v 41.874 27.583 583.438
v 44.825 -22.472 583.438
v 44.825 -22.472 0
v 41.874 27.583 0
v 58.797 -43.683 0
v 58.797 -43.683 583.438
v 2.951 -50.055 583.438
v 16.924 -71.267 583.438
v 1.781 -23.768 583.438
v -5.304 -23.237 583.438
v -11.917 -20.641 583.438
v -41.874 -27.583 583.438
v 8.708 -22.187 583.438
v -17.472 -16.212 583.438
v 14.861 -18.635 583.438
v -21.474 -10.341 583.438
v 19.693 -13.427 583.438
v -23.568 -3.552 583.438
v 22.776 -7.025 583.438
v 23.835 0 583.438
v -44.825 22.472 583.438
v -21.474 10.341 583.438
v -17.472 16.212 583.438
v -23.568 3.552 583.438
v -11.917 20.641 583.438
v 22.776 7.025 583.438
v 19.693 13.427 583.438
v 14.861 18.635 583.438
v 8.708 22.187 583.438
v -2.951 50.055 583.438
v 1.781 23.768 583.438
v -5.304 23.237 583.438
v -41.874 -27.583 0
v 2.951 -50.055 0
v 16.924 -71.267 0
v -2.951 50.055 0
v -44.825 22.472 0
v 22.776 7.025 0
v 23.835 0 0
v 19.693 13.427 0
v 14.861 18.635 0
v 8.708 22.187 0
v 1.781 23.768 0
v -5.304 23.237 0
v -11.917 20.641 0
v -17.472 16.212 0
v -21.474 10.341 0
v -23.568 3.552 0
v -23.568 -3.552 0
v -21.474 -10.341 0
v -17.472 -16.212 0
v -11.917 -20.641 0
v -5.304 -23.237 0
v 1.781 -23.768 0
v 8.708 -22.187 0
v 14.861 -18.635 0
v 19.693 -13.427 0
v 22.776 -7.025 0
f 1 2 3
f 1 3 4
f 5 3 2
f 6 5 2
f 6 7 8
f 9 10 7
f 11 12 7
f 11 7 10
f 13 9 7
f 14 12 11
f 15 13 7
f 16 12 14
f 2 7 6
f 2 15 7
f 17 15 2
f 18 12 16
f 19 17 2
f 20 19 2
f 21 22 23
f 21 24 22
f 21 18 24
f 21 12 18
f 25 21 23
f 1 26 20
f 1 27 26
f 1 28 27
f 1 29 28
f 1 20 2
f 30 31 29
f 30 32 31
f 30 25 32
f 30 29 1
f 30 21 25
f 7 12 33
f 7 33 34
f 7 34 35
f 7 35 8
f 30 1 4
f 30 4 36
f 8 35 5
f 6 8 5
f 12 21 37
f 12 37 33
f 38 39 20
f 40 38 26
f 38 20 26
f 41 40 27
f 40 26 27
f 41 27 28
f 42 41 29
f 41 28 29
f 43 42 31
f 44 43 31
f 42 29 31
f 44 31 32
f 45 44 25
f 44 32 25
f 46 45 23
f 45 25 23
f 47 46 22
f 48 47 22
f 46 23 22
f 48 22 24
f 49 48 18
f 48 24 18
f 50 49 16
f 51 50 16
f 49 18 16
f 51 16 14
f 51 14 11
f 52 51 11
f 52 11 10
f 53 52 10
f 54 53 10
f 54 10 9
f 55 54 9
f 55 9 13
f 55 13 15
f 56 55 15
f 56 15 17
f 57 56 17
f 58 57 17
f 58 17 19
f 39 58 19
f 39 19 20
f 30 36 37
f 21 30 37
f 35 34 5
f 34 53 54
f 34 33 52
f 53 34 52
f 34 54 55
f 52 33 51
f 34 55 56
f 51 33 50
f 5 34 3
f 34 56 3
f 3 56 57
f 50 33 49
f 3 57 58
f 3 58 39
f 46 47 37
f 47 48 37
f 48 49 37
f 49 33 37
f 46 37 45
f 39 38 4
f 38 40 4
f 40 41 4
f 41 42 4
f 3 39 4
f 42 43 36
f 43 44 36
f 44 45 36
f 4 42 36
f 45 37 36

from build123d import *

# Parameters (mm, degrees)
F1_DEPTH = 583.438
F2_DEPTH = 25.4
F3_R     = 23.8346071904
F4_DEPTH = 899.16


with BuildPart() as f1:
    # F0 (on Top) → F1 (new body)
    with BuildSketch(Plane.XY):
        Polygon((2.9511202201, -50.0551973681), (44.8246326223, -22.4718536038), (41.8735124022, 27.5833437643), (-2.9511202201, 50.0551973681), (-44.8246326223, 22.4718536038), (-41.8735124022, -27.5833437643), align=None)
    extrude(amount=F1_DEPTH)

    # F2 (add): a face of the model
    f2_faces = [f1.faces().sort_by_distance(p)[0] for p in [
        (23.8878764212, -36.263525486, 291.719),
    ]]
    extrude(f2_faces, amount=F2_DEPTH)

    # F3 (on face) → F4 (cut)
    with BuildSketch(Plane.XY.offset(583.438)):
        Circle(F3_R)
    extrude(amount=-F4_DEPTH, mode=Mode.SUBTRACT)


solid = f1.part
